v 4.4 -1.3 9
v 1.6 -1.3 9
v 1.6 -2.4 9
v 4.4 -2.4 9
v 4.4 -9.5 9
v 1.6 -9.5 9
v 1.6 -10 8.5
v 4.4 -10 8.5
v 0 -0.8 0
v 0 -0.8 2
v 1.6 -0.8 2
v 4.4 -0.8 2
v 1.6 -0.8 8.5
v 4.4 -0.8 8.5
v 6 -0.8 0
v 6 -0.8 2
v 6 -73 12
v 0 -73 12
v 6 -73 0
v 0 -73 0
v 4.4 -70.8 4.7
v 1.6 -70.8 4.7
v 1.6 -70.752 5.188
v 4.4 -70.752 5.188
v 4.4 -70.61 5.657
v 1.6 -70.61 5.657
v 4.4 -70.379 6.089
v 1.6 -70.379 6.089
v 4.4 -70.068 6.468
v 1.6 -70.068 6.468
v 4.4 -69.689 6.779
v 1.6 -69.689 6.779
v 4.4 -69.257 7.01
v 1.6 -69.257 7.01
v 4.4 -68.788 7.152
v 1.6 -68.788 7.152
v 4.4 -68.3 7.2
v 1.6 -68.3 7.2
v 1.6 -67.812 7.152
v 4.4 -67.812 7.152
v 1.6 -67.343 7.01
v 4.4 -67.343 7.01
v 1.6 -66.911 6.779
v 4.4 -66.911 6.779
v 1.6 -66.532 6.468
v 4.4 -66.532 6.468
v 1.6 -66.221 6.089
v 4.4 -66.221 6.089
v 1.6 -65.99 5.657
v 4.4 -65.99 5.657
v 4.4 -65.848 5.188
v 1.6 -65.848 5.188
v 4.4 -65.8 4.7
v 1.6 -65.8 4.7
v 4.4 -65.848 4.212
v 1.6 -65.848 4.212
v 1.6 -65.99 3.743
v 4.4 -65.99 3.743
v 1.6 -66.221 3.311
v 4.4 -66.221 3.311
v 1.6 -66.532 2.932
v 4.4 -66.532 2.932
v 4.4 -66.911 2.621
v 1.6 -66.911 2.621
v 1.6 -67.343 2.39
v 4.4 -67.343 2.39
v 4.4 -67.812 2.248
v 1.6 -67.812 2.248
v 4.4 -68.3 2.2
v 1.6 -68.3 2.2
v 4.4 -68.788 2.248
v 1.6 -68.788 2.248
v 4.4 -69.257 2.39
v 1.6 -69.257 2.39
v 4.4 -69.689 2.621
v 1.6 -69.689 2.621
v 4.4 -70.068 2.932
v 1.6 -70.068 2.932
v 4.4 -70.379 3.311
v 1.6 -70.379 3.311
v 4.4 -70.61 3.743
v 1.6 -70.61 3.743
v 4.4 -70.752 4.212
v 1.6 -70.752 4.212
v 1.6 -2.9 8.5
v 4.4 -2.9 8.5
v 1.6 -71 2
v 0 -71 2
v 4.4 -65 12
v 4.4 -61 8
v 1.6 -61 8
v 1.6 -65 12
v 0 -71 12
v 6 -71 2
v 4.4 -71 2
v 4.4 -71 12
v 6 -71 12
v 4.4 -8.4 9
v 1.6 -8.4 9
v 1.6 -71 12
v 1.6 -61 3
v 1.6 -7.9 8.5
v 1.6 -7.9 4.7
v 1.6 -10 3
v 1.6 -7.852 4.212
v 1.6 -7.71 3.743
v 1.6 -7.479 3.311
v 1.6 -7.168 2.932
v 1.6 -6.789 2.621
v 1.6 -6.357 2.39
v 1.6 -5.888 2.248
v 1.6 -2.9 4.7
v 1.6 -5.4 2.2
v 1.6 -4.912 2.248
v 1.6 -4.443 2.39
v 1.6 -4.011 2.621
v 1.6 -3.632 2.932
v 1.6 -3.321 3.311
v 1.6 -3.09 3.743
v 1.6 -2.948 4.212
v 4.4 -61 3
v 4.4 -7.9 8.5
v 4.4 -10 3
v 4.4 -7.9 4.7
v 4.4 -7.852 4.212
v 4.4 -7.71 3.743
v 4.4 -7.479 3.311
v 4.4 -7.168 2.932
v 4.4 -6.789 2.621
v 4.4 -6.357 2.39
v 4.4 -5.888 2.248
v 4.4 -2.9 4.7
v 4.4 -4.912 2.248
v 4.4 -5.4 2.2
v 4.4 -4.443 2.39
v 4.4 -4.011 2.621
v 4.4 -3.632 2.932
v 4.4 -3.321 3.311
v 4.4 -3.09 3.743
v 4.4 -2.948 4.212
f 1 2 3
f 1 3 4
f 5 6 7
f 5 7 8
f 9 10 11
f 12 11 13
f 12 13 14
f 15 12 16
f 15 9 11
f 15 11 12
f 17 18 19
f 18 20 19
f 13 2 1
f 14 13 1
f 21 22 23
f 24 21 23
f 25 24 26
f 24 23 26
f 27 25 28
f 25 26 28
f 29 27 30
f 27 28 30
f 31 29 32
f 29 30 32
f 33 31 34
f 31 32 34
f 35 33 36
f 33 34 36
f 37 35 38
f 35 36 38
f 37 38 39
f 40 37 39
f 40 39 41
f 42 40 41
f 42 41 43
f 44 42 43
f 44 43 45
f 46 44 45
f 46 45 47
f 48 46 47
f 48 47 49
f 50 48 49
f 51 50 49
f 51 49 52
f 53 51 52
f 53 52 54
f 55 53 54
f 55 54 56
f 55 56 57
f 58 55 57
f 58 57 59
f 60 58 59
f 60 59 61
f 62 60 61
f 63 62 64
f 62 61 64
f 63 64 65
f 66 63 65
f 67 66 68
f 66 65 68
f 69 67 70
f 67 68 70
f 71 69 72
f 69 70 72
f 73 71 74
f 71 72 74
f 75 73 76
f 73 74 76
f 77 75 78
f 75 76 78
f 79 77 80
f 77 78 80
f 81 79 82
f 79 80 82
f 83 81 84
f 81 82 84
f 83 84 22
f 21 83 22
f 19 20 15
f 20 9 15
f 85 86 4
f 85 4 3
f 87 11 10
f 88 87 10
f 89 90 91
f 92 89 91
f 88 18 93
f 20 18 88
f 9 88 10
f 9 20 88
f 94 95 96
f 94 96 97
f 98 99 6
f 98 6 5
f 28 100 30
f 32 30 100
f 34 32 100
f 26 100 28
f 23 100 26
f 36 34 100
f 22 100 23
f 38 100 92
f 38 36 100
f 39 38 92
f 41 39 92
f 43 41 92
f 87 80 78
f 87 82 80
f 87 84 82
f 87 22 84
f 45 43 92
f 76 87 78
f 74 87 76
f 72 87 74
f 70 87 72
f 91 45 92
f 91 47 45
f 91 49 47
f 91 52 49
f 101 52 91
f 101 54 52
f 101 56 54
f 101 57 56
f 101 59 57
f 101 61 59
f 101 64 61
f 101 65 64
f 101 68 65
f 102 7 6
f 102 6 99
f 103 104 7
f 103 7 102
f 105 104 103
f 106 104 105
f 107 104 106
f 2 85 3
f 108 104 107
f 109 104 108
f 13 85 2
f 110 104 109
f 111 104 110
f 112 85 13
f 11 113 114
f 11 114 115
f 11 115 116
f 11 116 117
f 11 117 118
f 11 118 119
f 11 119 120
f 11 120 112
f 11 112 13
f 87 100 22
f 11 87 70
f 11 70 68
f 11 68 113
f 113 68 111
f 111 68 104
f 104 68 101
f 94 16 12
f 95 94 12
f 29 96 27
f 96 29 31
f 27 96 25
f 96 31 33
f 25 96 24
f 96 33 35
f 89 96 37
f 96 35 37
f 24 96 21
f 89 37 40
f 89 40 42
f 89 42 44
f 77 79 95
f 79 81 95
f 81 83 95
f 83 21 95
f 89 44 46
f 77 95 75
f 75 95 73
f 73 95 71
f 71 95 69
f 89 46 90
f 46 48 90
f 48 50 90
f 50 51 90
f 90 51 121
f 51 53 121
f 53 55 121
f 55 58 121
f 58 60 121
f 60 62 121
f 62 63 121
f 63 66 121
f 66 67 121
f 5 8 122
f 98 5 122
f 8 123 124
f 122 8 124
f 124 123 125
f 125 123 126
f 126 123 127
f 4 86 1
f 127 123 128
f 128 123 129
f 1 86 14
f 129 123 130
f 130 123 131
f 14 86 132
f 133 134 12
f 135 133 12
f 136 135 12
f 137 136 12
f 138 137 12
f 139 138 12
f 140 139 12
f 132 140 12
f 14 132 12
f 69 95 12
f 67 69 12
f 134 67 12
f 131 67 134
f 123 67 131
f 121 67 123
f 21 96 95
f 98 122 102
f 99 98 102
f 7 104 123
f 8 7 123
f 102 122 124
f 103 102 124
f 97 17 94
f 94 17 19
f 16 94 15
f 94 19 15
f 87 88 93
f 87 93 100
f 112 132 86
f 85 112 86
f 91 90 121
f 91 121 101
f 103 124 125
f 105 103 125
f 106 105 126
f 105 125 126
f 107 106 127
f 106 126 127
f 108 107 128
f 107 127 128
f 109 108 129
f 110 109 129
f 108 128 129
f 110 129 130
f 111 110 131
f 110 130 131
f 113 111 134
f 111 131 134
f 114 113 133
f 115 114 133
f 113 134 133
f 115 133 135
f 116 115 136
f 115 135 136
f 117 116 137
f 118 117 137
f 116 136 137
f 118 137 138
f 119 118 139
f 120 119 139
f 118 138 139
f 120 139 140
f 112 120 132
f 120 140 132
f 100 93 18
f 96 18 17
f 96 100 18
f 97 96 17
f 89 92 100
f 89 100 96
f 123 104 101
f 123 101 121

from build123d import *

# Parameters (mm, degrees)
F0_W      = 6
F0_H      = 10
F1_DEPTH  = 2
F2_W      = 2.8
F2_H      = 10
F3_DEPTH  = 10
F4_DEPTH  = 3
F5_DEPTH  = 0.8
F7_DEPTH  = 25
F8_SIZE   = 0.5
F10_DEPTH = 63
F11_W     = 6
F11_H     = 2
F12_DEPTH = 10
F13_W     = 2.8
F13_H     = 10
F14_DEPTH = 10
F15_R     = 2.5
F16_DEPTH = 25
F17_SIZE  = 4
F18_W     = 2.8
F18_H     = 51
F19_DEPTH = 1


with BuildPart() as f1:
    # F0 (on Top) → F1 (new body)
    with BuildSketch(Plane.XY):
        with Locations((3, -5)):
            Rectangle(F0_W, F0_H)
    extrude(amount=F1_DEPTH)

    # F2 (on face) → F3 (join)
    with BuildSketch(Plane.XY.offset(2)):
        with Locations((3, -5)):
            Rectangle(F2_W, F2_H)
    extrude(amount=F3_DEPTH)

    # F4 (cut): a face of the model
    f4_faces = [f1.faces().sort_by_distance(p)[0] for p in [
        (3, -5, 12),
    ]]
    extrude(f4_faces, amount=-F4_DEPTH, mode=Mode.SUBTRACT)

    # F5 (cut): a face of the model
    f5_faces = [f1.faces().sort_by_distance(p)[0] for p in [
        (3, 0, 3.7911392405),
    ]]
    extrude(f5_faces, amount=-F5_DEPTH, mode=Mode.SUBTRACT)

    # F6 (on face) → F7 (cut)
    with BuildSketch(Plane.YZ.offset(4.4)):
        with BuildLine():
            Line((-7.9, 9), (-7.9, 4.7))
            ThreePointArc((-7.9, 4.7), (-5.4, 2.2), (-2.9, 4.7))
            Line((-2.9, 4.7), (-2.9, 9))
            Line((-2.9, 9), (-7.9, 9))
        make_face()
    extrude(amount=-F7_DEPTH, mode=Mode.SUBTRACT)

    # F8
    f8_edges = [f1.edges().sort_by_distance(p)[0] for p in [
        (3, -7.9, 9),
        (3, -2.9, 9),
        (3, -10, 9),
        (3, -0.8, 9),
    ]]
    chamfer(f8_edges, length=F8_SIZE)

    # F9 (on face) → F10 (join)
    with BuildSketch(Plane.XZ.offset(10)):
        Polygon((1.6, 2), (0, 2), (0, 0), (6, 0), (6, 2), (4.4, 2), align=None)
    extrude(amount=F10_DEPTH)

    # F11 (on face) → F12 (join)
    with BuildSketch(Plane.XY.offset(2)):
        with Locations((3, -72)):
            Rectangle(F11_W, F11_H)
    extrude(amount=F12_DEPTH)

    # F13 (on face) → F14 (join)
    with BuildSketch(Plane(origin=(0, -71, 0), x_dir=(-1, 0, 0), z_dir=(0, 1, 0))):
        with Locations((-3, 7)):
            Rectangle(F13_W, F13_H)
    extrude(amount=F14_DEPTH)

    # F15 (on face) → F16 (cut)
    with BuildSketch(Plane(origin=(1.6, 0, 0), x_dir=(0, -1, 0), z_dir=(-1, 0, 0))):
        with Locations((68.3, 4.7)):
            Circle(F15_R)
    extrude(amount=-F16_DEPTH, mode=Mode.SUBTRACT)

    # F17
    f17_edges = [f1.edges().sort_by_distance(p)[0] for p in [
        (3, -61, 12),
    ]]
    chamfer(f17_edges, length=F17_SIZE)

    # F18 (on face) → F19 (join)
    with BuildSketch(Plane.XY.offset(2)):
        with Locations((3, -35.5)):
            Rectangle(F18_W, F18_H)
    extrude(amount=F19_DEPTH)


solid = f1.part
